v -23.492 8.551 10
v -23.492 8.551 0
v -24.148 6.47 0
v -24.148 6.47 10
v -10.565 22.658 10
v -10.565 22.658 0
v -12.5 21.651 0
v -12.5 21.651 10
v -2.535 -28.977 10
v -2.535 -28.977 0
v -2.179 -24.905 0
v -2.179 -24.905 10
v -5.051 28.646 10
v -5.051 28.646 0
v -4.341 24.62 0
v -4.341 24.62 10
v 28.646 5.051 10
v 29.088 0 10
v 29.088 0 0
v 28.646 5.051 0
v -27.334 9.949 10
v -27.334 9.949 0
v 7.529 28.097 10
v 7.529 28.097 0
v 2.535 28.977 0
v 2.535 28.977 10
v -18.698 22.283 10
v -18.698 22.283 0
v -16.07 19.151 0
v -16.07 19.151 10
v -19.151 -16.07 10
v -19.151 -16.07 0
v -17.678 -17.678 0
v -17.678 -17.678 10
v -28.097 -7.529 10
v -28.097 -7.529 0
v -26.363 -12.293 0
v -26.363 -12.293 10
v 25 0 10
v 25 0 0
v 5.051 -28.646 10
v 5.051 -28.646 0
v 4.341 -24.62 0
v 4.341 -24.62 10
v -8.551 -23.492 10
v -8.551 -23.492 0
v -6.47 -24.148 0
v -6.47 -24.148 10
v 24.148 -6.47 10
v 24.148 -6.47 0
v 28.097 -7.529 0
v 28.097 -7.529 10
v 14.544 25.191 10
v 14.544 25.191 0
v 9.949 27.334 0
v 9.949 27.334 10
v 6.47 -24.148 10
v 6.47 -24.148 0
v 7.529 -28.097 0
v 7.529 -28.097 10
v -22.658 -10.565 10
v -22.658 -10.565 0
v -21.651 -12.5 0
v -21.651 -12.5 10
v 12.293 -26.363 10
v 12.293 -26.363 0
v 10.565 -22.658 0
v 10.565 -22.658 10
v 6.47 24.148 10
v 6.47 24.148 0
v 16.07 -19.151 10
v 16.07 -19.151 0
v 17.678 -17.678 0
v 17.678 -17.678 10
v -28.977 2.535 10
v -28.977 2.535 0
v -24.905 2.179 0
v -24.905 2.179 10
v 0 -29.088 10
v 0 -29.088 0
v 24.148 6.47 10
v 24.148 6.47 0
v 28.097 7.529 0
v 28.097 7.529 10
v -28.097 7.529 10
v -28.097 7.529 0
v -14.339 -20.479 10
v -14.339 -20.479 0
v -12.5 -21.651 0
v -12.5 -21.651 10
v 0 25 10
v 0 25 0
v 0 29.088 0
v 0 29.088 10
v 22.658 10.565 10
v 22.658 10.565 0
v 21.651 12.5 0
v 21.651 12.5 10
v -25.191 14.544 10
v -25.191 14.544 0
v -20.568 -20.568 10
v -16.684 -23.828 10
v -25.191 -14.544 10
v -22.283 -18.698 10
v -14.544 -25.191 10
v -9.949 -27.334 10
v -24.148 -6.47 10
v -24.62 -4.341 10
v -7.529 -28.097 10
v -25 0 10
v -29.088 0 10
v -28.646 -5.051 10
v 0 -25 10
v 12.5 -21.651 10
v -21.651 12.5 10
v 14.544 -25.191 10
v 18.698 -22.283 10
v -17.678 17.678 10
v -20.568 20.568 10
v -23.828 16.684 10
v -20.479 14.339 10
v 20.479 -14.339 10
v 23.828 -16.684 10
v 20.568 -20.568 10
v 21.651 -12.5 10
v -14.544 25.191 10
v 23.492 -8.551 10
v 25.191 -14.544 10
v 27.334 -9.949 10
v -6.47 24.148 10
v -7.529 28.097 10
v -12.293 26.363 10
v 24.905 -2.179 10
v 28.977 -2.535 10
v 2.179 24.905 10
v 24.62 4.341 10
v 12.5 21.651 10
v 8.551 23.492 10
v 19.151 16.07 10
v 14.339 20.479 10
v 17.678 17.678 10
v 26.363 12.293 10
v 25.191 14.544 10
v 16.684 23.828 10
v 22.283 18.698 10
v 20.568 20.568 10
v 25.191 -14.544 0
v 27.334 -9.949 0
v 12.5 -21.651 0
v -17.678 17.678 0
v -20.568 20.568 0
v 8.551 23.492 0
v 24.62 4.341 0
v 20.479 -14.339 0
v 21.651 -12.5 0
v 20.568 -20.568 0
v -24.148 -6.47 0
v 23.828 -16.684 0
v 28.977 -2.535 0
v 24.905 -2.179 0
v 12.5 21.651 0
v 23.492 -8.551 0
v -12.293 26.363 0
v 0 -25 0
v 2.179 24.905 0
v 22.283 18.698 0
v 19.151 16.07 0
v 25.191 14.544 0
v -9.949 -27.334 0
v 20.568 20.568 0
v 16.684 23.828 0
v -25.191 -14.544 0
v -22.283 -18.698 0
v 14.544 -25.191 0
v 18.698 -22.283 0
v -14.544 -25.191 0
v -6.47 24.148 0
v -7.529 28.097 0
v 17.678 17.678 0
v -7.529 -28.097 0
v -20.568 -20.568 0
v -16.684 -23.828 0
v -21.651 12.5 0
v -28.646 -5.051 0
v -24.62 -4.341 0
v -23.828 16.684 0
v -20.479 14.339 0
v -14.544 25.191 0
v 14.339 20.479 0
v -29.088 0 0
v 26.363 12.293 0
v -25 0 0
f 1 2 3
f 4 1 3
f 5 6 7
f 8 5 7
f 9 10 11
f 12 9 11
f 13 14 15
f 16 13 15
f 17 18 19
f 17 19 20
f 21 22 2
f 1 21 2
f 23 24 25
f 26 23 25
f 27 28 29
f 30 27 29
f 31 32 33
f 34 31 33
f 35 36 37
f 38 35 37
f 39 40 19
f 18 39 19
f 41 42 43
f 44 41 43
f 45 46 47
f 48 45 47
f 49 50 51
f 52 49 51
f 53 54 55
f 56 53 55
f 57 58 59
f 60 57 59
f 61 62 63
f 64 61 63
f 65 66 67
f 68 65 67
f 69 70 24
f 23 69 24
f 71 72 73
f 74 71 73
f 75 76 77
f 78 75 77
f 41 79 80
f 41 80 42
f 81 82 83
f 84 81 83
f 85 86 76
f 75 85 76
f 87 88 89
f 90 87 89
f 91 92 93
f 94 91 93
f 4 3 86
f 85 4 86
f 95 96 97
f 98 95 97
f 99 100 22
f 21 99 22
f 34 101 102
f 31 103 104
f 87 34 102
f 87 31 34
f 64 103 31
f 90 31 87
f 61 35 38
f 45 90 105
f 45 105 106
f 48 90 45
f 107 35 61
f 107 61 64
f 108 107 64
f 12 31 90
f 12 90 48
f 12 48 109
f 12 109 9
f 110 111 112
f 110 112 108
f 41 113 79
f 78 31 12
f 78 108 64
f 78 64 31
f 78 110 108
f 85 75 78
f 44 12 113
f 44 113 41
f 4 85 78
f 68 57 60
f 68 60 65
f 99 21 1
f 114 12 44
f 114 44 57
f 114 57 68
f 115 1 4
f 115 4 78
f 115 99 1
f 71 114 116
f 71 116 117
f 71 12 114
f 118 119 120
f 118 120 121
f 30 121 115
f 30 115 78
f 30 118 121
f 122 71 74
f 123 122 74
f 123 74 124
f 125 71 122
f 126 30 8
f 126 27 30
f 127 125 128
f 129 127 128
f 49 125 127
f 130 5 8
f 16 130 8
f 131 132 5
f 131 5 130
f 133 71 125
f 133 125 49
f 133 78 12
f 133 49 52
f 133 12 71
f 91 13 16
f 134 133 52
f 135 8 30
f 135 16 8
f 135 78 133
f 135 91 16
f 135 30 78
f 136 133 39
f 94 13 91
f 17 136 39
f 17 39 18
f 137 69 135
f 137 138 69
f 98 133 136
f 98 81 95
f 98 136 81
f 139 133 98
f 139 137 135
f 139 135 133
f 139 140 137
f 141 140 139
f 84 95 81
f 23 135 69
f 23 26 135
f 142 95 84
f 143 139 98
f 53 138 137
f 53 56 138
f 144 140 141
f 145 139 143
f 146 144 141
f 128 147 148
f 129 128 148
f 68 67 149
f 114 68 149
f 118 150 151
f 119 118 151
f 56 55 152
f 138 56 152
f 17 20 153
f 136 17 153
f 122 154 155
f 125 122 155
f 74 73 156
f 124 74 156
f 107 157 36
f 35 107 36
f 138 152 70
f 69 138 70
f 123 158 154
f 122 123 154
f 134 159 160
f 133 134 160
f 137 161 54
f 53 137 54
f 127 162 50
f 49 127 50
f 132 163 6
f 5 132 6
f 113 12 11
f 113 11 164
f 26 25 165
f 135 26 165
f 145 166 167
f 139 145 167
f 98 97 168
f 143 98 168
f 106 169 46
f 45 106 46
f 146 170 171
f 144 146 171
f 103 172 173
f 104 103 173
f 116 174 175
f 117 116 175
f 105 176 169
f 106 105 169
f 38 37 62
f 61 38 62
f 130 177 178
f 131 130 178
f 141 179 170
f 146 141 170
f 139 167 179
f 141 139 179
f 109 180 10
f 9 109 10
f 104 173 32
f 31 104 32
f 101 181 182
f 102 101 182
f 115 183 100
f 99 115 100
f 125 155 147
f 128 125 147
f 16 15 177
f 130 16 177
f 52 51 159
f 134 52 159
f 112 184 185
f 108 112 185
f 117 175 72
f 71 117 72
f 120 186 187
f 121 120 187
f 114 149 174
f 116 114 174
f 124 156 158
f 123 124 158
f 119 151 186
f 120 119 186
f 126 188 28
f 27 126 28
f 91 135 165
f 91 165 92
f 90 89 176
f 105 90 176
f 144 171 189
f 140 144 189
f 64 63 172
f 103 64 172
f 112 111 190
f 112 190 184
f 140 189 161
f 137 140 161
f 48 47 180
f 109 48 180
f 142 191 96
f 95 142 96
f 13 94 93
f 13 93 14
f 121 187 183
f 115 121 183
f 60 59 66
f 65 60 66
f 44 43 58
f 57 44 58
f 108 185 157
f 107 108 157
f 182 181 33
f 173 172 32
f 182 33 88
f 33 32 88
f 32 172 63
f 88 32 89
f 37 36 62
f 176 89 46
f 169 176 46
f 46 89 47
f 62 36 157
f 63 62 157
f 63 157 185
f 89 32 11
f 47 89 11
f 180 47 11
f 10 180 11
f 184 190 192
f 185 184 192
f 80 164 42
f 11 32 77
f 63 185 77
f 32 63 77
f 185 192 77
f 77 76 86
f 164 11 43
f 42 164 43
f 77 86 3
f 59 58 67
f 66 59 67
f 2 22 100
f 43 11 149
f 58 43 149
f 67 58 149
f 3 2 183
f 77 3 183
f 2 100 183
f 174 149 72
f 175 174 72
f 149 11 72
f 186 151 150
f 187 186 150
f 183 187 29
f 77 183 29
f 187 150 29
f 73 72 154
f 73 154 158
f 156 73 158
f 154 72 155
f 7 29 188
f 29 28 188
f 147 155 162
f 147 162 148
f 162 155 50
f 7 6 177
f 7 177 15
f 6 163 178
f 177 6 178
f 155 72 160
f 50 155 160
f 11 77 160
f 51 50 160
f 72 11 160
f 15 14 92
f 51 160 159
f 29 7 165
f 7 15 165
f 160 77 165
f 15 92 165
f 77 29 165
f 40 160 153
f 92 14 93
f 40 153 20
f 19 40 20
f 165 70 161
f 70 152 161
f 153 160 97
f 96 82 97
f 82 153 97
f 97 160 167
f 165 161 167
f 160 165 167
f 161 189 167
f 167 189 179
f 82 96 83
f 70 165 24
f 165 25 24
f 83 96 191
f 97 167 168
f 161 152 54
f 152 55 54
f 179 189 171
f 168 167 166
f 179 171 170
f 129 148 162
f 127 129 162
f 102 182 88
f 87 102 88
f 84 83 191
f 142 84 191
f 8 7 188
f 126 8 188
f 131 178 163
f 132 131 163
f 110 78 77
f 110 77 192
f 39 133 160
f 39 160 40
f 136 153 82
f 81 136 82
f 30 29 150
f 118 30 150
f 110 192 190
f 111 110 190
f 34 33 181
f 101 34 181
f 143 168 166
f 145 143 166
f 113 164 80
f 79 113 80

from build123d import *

# Parameters (mm, degrees)
F1_DEPTH = 10


with BuildPart() as f1:
    # F0 (on Top) → F1 (new body)
    with BuildSketch(Plane.XY):
        Polygon((2.178894, 24.904867), (0, 25), (0, 29.088151), (-5.051104, 28.646236), (-4.341204, 24.620194), (-6.470476, 24.148146), (-7.528567, 28.096996), (-12.293184, 26.362817), (-10.565457, 22.657695), (-12.5, 21.650635), (-14.544075, 25.191077), (-18.697503, 22.282816), (-16.06969, 19.151111), (-17.67767, 17.67767), (-20.568429, 20.568429), (-23.827618, 16.684278), (-20.478801, 14.339411), (-21.650635, 12.5), (-25.191077, 14.544075), (-27.333921, 9.948733), (-23.492316, 8.550504), (-24.148146, 6.470476), (-28.096996, 7.528567), (-28.977462, 2.535199), (-24.904867, 2.178894), (-25, 0), (-29.088151, 0), (-28.646236, -5.051104), (-24.620194, -4.341204), (-24.148146, -6.470476), (-28.096996, -7.528567), (-26.362817, -12.293184), (-22.657695, -10.565457), (-21.650635, -12.5), (-25.191077, -14.544075), (-22.282816, -18.697503), (-19.151111, -16.06969), (-17.67767, -17.67767), (-20.568429, -20.568429), (-16.684278, -23.827618), (-14.339411, -20.478801), (-12.5, -21.650635), (-14.544075, -25.191077), (-9.948733, -27.333921), (-8.550504, -23.492316), (-6.470476, -24.148146), (-7.528567, -28.096996), (-2.535199, -28.977462), (-2.178894, -24.904867), (0, -25), (0, -29.088151), (5.051104, -28.646236), (4.341204, -24.620194), (6.470476, -24.148146), (7.528567, -28.096996), (12.293184, -26.362817), (10.565457, -22.657695), (12.5, -21.650635), (14.544075, -25.191077), (18.697503, -22.282816), (16.06969, -19.151111), (17.67767, -17.67767), (20.568429, -20.568429), (23.827618, -16.684278), (20.478801, -14.339411), (21.650635, -12.5), (25.191077, -14.544075), (27.333921, -9.948733), (23.492316, -8.550504), (24.148146, -6.470476), (28.096996, -7.528567), (28.977462, -2.535199), (24.904867, -2.178894), (25, 0), (29.088151, 0), (28.646236, 5.051104), (24.620194, 4.341204), (24.148146, 6.470476), (28.096996, 7.528567), (26.362817, 12.293184), (22.657695, 10.565457), (21.650635, 12.5), (25.191077, 14.544075), (22.282816, 18.697503), (19.151111, 16.06969), (17.67767, 17.67767), (20.568429, 20.568429), (16.684278, 23.827618), (14.339411, 20.478801), (12.5, 21.650635), (14.544075, 25.191077), (9.948733, 27.333921), (8.550504, 23.492316), (6.470476, 24.148146), (7.528567, 28.096996), (2.535199, 28.977462), align=None)
    extrude(amount=F1_DEPTH)


solid = f1.part
